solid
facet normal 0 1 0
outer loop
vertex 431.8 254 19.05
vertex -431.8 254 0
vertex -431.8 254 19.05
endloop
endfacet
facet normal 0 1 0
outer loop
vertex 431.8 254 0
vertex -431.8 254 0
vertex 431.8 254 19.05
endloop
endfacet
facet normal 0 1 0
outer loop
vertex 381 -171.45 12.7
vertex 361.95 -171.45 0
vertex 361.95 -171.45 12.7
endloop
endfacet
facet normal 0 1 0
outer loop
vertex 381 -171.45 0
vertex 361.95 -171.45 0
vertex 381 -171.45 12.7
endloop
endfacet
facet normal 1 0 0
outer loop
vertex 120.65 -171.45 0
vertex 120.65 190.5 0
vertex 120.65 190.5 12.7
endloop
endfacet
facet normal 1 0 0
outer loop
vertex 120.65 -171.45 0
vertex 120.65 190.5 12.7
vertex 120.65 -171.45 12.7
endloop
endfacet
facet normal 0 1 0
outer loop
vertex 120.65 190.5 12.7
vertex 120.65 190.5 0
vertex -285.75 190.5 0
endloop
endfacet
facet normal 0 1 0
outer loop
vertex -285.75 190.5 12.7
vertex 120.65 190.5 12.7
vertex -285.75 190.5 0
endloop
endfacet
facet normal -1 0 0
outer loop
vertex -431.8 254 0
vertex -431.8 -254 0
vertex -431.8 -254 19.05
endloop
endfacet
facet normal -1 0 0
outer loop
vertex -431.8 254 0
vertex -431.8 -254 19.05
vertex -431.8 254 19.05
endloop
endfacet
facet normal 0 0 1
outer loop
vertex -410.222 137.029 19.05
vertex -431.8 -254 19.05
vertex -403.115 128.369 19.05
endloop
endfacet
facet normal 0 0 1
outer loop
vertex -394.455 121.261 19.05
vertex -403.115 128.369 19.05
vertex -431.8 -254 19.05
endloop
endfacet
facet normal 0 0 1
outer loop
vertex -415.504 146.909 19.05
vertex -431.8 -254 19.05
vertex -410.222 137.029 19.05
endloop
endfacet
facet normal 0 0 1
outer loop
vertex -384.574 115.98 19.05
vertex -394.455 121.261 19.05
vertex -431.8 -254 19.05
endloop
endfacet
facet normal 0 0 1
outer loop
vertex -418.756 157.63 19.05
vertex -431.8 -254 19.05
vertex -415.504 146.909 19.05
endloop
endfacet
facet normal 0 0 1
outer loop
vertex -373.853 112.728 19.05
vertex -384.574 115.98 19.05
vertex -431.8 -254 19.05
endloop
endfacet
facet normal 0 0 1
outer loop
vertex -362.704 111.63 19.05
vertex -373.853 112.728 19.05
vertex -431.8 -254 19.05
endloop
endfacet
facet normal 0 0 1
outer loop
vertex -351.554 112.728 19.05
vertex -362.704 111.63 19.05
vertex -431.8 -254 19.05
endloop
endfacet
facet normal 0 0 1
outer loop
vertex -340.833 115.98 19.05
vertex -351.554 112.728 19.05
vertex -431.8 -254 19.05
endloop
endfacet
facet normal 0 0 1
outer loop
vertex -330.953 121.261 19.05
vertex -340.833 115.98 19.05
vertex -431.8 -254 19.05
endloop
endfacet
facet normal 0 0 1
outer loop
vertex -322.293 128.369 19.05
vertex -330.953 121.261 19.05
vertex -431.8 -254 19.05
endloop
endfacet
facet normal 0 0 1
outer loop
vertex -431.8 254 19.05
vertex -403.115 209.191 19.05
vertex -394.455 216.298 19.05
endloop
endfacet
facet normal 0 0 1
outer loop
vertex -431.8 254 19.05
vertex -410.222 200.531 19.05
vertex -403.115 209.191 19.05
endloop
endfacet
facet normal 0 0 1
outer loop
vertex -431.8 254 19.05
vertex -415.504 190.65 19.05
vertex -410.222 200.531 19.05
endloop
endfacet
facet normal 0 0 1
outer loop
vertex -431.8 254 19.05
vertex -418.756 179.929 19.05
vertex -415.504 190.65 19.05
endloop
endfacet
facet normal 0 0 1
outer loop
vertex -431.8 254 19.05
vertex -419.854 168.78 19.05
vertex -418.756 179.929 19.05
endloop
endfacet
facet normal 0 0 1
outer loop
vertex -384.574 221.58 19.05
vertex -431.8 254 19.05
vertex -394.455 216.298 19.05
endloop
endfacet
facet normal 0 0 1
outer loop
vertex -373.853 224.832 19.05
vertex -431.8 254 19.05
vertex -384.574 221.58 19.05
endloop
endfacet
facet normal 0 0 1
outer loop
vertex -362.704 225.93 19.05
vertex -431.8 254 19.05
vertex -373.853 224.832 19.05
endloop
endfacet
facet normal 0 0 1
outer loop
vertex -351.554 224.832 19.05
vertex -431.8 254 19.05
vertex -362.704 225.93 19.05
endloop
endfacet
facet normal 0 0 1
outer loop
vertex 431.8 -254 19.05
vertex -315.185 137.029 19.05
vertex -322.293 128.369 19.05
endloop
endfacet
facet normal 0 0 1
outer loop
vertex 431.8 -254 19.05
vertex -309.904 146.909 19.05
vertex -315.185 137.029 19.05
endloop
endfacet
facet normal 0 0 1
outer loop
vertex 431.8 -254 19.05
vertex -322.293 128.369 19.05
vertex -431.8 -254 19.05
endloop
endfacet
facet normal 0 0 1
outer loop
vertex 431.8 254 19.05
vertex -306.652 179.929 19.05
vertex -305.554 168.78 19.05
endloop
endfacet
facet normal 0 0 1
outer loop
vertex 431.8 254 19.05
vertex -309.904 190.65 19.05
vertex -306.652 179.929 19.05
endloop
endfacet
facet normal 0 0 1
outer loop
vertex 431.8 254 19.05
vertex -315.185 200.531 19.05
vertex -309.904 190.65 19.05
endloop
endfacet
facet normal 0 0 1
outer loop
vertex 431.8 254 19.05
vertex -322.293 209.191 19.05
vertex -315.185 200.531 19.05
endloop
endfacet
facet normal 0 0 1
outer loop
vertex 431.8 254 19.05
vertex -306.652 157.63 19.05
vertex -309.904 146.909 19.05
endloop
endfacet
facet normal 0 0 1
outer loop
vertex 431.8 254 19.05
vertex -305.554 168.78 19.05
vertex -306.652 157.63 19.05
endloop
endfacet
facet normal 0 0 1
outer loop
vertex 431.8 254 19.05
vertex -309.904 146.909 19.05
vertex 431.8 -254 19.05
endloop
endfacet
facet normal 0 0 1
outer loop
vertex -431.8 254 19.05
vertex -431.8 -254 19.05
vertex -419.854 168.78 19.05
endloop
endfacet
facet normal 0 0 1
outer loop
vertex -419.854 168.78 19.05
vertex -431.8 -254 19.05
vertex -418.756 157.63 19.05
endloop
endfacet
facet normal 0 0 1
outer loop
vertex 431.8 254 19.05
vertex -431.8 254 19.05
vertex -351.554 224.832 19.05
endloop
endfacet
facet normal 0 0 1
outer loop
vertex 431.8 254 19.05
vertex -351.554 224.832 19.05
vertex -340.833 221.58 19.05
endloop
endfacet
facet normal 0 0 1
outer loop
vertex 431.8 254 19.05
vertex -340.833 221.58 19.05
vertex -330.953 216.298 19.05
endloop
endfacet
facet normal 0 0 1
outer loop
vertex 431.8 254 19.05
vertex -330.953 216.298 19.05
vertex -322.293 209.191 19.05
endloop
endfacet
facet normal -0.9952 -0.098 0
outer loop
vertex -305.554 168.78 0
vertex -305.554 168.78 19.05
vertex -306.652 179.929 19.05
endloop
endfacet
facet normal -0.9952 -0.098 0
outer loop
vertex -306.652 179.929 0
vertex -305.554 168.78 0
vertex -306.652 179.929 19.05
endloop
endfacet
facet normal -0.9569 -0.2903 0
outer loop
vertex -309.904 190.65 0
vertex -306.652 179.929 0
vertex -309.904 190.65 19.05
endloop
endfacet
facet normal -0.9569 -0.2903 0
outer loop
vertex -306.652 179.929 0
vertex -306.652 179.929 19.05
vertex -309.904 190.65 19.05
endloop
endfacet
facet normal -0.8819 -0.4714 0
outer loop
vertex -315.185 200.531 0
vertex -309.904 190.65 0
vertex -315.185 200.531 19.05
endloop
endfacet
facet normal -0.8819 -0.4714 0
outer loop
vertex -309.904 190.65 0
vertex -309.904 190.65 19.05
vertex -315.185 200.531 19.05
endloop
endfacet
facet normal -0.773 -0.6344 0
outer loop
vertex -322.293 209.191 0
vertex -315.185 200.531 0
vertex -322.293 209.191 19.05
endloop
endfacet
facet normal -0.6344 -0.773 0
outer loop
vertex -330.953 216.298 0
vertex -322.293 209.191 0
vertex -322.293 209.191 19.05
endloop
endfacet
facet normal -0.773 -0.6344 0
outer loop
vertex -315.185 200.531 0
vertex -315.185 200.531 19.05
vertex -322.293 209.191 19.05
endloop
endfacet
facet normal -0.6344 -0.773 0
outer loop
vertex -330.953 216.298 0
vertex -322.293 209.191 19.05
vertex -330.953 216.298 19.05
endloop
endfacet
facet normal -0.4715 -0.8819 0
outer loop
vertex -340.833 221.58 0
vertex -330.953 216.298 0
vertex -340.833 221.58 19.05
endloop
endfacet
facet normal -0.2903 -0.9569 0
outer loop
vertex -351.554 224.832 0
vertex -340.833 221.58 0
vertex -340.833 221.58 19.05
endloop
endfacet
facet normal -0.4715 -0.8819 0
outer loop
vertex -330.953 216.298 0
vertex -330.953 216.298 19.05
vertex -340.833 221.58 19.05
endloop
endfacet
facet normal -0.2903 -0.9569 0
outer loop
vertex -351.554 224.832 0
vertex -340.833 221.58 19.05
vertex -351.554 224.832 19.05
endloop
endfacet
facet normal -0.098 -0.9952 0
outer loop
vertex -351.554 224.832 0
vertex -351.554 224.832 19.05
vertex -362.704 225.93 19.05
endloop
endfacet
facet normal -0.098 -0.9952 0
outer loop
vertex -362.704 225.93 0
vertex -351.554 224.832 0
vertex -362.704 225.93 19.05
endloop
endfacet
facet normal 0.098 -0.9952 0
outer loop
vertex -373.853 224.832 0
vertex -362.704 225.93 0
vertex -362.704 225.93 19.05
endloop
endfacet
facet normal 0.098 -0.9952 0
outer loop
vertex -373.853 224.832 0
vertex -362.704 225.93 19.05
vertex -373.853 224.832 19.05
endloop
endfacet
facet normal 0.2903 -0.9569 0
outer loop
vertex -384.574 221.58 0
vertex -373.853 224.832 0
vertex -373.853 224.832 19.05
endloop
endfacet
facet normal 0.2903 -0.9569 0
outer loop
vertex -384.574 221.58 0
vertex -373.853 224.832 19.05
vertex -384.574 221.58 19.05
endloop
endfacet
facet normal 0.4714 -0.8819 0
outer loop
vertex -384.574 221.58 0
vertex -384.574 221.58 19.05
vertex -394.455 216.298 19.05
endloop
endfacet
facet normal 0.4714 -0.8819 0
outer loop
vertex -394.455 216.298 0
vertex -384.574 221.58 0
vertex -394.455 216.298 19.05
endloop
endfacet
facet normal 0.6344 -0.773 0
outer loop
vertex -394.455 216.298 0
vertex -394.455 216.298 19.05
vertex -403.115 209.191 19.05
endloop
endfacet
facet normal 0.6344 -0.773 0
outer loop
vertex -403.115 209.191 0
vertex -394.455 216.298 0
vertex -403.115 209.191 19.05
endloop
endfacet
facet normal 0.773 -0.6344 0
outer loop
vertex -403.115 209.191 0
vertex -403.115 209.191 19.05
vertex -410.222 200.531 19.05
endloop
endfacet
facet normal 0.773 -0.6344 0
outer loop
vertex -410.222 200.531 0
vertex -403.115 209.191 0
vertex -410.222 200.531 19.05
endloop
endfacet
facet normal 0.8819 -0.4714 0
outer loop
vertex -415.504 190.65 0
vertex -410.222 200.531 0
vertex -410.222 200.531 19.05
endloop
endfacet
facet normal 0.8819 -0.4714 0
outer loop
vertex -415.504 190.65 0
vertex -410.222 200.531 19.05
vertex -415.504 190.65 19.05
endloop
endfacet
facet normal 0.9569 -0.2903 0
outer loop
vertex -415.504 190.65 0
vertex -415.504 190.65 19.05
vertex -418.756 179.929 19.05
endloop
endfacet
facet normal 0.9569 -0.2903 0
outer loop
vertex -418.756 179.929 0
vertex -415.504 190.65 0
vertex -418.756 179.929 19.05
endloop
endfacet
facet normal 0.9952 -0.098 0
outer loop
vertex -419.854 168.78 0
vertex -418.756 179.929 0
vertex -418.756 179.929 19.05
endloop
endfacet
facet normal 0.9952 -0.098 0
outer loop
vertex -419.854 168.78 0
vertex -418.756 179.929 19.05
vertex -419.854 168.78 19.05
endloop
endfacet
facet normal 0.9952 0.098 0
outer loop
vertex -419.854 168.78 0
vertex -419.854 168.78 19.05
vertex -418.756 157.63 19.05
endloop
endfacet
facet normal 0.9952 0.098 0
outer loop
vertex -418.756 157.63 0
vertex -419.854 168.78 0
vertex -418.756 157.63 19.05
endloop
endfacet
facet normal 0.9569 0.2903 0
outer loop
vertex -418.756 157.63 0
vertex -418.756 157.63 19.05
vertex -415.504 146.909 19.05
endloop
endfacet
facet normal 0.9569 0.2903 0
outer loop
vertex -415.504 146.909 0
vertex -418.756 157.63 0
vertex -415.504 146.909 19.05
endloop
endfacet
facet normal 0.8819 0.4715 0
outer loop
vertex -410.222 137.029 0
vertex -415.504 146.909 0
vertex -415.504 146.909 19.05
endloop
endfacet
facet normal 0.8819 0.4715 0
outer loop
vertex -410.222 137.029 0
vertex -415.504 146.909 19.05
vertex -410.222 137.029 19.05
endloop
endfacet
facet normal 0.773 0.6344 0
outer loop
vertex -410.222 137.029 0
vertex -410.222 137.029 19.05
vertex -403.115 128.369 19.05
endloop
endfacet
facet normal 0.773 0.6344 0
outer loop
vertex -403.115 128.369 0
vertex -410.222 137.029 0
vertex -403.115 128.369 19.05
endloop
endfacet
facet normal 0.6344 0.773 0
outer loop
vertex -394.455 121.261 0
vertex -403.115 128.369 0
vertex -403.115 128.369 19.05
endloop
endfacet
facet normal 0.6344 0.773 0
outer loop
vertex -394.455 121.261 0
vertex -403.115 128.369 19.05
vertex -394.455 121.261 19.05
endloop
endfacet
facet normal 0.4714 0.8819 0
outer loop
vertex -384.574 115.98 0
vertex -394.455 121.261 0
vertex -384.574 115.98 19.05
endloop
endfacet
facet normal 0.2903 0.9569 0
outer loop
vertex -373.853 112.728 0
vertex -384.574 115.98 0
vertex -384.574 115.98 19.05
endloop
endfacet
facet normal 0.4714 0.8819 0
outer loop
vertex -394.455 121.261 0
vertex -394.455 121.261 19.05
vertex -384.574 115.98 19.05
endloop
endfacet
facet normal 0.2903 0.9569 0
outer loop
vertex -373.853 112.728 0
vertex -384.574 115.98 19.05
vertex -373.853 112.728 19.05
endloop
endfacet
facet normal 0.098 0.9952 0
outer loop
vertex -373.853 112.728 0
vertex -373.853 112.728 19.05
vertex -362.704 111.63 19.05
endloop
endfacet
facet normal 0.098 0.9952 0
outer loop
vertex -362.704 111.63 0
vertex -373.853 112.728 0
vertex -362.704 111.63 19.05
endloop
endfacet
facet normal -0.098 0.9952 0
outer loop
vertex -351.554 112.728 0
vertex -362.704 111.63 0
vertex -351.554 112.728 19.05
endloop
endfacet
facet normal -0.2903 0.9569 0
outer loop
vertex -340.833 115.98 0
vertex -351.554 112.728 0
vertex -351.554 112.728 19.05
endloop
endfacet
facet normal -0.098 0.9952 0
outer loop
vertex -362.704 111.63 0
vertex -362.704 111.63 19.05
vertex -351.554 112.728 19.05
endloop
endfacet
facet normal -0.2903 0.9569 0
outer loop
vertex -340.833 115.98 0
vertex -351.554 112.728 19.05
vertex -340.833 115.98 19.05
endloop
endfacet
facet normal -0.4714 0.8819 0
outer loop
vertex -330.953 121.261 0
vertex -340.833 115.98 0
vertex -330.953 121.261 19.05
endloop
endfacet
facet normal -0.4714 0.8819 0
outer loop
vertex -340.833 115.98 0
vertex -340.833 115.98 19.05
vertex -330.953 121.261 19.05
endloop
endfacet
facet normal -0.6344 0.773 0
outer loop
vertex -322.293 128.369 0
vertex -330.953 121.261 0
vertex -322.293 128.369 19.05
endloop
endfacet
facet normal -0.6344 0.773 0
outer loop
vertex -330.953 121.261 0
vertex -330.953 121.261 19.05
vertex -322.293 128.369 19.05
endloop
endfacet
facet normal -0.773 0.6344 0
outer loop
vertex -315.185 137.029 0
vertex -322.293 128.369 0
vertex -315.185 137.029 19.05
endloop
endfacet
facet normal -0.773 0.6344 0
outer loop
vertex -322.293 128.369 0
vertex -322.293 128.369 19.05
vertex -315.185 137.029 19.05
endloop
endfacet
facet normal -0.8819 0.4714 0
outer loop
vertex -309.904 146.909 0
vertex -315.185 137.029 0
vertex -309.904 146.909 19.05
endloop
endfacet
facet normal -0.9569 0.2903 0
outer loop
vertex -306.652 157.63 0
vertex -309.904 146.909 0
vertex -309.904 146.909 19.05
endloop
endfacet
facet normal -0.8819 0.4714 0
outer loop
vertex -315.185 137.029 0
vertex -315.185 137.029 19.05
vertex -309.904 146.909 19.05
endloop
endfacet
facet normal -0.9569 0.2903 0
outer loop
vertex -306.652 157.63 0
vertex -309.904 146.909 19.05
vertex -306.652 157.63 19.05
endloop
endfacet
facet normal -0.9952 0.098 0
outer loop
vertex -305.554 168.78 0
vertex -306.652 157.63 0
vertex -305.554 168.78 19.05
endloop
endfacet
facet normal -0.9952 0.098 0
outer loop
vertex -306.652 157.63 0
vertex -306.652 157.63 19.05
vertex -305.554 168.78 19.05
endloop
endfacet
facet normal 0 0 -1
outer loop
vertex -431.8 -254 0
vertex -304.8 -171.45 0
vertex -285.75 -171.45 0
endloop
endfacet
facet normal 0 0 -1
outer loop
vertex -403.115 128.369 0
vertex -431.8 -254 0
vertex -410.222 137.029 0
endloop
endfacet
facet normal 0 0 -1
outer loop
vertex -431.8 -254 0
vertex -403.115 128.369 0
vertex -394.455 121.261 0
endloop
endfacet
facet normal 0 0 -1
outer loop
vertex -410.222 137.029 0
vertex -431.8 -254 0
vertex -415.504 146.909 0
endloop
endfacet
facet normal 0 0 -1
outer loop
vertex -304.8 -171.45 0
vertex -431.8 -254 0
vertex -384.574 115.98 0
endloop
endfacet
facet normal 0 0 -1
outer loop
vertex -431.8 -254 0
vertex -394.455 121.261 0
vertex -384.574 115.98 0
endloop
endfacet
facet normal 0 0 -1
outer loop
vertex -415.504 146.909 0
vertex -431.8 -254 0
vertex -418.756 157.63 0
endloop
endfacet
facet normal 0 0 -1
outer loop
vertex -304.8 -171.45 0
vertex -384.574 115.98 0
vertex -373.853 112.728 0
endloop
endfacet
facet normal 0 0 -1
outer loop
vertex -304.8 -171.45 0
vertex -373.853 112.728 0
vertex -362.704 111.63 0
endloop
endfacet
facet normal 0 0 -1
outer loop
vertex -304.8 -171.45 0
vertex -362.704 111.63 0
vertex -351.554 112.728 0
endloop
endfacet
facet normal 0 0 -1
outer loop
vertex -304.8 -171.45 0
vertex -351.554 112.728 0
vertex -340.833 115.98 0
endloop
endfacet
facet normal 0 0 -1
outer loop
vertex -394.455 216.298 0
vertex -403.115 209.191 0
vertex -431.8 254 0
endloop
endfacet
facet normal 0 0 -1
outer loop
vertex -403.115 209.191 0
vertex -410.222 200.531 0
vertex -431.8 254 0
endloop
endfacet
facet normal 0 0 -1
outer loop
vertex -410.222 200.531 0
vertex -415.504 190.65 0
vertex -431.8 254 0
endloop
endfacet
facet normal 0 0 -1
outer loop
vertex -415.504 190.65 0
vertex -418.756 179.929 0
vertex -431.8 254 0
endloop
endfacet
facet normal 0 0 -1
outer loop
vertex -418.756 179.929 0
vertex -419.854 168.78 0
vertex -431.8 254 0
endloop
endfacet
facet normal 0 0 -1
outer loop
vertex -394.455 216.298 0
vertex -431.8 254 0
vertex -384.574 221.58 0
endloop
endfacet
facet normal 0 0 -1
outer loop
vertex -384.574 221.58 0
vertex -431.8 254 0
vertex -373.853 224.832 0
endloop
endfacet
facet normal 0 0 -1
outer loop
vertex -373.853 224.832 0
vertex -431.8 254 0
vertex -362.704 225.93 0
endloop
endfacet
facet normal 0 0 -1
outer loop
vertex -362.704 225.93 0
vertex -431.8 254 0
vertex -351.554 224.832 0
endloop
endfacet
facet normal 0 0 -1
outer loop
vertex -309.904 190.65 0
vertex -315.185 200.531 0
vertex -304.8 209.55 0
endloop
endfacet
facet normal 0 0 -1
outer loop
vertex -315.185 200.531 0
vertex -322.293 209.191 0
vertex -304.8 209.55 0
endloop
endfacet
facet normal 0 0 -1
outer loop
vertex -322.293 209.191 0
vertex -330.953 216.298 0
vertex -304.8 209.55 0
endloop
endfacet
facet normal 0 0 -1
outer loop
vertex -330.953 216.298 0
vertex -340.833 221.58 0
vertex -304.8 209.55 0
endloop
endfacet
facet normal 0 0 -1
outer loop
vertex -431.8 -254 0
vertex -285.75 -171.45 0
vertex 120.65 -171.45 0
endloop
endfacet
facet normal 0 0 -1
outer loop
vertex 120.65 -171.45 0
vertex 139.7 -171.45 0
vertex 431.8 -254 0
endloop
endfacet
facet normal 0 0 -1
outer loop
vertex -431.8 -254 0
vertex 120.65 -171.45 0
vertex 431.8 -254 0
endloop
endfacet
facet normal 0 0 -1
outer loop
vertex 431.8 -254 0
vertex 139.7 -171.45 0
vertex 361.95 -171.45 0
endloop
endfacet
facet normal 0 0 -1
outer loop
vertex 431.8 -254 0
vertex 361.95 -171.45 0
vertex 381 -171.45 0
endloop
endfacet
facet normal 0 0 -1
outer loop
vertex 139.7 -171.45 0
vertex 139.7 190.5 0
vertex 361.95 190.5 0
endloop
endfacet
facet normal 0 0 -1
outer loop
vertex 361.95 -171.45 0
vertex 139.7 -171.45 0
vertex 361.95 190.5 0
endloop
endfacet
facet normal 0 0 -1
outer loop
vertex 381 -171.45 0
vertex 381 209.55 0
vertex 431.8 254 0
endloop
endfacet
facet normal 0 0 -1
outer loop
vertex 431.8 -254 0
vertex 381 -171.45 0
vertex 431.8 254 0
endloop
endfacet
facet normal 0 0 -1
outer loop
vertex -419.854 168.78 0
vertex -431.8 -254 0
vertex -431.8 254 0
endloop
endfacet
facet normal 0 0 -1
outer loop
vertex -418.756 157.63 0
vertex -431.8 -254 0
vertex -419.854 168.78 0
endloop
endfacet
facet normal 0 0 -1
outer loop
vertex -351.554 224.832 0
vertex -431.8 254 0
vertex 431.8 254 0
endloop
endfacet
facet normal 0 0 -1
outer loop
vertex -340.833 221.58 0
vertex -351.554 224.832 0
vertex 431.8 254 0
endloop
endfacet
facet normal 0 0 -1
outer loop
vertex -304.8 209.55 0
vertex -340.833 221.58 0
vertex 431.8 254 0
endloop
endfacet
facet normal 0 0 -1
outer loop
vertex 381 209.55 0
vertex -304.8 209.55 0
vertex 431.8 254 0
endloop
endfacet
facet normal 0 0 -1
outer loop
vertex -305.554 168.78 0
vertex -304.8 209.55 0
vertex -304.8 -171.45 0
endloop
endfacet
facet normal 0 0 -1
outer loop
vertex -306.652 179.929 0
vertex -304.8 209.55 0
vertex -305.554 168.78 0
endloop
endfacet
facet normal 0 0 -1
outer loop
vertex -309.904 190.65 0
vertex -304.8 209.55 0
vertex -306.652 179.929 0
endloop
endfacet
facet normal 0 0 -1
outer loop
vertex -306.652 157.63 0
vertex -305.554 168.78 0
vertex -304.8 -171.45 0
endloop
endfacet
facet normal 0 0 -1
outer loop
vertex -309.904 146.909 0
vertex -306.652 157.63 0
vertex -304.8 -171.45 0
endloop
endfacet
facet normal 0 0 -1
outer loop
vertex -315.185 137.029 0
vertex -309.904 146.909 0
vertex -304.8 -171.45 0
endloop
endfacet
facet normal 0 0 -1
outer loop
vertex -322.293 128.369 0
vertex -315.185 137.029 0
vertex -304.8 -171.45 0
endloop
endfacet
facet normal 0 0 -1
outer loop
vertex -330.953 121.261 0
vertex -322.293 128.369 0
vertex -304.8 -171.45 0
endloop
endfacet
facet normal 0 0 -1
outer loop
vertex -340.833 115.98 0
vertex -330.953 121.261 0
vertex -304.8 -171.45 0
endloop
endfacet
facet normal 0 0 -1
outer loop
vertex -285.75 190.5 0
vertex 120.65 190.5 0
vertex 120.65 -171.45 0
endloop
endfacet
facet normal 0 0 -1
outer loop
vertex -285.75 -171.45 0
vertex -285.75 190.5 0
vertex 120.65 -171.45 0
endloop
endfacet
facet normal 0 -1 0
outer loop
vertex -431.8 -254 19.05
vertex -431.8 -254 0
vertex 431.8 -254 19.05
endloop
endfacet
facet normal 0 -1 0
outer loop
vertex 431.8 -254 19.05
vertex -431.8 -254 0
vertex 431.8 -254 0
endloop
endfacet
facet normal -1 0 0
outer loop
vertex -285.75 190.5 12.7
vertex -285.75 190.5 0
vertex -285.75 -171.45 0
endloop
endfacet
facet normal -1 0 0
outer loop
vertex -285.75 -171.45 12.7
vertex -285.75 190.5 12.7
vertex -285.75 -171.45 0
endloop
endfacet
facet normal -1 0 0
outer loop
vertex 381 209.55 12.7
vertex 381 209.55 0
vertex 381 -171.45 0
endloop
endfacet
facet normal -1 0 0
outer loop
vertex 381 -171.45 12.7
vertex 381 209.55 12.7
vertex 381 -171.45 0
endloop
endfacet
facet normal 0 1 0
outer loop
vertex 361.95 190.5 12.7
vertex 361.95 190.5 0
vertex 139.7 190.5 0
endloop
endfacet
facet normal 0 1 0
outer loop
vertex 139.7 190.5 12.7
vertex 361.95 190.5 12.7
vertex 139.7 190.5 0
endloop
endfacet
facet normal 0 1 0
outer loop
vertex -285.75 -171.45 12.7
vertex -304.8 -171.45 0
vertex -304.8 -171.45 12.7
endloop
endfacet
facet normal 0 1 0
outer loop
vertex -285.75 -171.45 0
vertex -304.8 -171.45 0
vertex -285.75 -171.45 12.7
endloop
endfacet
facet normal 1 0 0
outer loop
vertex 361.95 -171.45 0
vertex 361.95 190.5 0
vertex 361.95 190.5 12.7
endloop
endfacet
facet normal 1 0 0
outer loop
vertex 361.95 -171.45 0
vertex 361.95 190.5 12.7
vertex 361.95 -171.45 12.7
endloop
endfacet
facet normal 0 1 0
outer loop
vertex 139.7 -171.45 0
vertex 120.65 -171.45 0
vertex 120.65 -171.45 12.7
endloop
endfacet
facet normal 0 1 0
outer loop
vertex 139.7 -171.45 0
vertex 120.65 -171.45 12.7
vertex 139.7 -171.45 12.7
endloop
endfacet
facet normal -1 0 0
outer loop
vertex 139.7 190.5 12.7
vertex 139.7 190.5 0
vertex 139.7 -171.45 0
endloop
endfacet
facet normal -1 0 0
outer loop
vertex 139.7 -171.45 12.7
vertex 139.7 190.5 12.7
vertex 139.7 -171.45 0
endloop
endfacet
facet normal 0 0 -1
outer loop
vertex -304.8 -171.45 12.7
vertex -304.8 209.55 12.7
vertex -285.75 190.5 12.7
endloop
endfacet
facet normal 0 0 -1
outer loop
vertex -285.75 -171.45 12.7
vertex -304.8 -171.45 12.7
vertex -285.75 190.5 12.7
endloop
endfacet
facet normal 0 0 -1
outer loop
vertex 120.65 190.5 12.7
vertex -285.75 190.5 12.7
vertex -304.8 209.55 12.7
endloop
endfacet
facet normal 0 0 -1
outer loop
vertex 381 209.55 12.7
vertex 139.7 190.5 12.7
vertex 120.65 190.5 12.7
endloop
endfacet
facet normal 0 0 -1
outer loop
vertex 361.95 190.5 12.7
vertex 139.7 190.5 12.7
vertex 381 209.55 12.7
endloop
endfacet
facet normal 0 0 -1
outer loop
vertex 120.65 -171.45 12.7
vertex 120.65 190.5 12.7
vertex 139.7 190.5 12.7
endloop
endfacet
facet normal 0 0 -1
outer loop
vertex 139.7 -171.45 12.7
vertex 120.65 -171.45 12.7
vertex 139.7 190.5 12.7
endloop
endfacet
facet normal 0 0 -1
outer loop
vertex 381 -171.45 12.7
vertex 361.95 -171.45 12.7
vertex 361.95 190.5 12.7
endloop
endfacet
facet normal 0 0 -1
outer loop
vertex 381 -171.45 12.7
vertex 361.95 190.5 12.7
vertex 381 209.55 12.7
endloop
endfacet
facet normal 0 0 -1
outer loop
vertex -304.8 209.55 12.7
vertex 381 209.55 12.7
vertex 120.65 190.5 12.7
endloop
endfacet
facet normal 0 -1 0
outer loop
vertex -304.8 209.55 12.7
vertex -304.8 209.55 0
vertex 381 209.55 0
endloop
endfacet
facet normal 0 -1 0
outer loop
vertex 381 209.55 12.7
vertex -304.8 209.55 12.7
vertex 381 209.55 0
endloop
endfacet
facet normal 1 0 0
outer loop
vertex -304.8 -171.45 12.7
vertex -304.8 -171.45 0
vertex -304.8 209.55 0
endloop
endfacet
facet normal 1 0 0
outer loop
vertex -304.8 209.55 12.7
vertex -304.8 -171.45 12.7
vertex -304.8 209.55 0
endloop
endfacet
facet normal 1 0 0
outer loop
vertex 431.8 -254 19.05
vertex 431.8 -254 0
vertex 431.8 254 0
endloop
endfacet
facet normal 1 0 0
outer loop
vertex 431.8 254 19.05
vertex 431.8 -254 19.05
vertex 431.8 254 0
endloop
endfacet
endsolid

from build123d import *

# Parameters (mm, degrees)
F0_W     = 863.6
F0_H     = 508
F1_DEPTH = 19.05
F2_W     = 19.05
F2_H     = 361.95
F3_DEPTH = 12.7
F4_R     = 57.15
F5_DEPTH = 25.4


with BuildPart() as f1:
    # F0 (on Top) → F1 (new body)
    with BuildSketch(Plane.XY):
        Rectangle(F0_W, F0_H)
    extrude(amount=F1_DEPTH)

    # F2 (on face) → F3 (cut)
    with BuildSketch(Plane(origin=(0, 0, 0), x_dir=(1, 0, 0), z_dir=(0, 0, -1))):
        Polygon((-304.8, -209.55), (381, -209.55), (381, -190.5), (361.95, -190.5), (139.7, -190.5), (120.65, -190.5), (-285.75, -190.5), (-304.8, -190.5), align=None)
        with Locations((371.475, -9.525)):
            Rectangle(F2_W, F2_H)
        with Locations((-295.275, -9.525)):
            Rectangle(F2_W, F2_H)
        with Locations((130.175, -9.525)):
            Rectangle(F2_W, F2_H)
    extrude(amount=-F3_DEPTH, mode=Mode.SUBTRACT)

    # F4 (on face) → F5 (cut)
    with BuildSketch(Plane.XY.offset(19.05)):
        with Locations((-362.7038, 168.77979)):
            Circle(F4_R)
    extrude(amount=-F5_DEPTH, mode=Mode.SUBTRACT)


solid = f1.part
